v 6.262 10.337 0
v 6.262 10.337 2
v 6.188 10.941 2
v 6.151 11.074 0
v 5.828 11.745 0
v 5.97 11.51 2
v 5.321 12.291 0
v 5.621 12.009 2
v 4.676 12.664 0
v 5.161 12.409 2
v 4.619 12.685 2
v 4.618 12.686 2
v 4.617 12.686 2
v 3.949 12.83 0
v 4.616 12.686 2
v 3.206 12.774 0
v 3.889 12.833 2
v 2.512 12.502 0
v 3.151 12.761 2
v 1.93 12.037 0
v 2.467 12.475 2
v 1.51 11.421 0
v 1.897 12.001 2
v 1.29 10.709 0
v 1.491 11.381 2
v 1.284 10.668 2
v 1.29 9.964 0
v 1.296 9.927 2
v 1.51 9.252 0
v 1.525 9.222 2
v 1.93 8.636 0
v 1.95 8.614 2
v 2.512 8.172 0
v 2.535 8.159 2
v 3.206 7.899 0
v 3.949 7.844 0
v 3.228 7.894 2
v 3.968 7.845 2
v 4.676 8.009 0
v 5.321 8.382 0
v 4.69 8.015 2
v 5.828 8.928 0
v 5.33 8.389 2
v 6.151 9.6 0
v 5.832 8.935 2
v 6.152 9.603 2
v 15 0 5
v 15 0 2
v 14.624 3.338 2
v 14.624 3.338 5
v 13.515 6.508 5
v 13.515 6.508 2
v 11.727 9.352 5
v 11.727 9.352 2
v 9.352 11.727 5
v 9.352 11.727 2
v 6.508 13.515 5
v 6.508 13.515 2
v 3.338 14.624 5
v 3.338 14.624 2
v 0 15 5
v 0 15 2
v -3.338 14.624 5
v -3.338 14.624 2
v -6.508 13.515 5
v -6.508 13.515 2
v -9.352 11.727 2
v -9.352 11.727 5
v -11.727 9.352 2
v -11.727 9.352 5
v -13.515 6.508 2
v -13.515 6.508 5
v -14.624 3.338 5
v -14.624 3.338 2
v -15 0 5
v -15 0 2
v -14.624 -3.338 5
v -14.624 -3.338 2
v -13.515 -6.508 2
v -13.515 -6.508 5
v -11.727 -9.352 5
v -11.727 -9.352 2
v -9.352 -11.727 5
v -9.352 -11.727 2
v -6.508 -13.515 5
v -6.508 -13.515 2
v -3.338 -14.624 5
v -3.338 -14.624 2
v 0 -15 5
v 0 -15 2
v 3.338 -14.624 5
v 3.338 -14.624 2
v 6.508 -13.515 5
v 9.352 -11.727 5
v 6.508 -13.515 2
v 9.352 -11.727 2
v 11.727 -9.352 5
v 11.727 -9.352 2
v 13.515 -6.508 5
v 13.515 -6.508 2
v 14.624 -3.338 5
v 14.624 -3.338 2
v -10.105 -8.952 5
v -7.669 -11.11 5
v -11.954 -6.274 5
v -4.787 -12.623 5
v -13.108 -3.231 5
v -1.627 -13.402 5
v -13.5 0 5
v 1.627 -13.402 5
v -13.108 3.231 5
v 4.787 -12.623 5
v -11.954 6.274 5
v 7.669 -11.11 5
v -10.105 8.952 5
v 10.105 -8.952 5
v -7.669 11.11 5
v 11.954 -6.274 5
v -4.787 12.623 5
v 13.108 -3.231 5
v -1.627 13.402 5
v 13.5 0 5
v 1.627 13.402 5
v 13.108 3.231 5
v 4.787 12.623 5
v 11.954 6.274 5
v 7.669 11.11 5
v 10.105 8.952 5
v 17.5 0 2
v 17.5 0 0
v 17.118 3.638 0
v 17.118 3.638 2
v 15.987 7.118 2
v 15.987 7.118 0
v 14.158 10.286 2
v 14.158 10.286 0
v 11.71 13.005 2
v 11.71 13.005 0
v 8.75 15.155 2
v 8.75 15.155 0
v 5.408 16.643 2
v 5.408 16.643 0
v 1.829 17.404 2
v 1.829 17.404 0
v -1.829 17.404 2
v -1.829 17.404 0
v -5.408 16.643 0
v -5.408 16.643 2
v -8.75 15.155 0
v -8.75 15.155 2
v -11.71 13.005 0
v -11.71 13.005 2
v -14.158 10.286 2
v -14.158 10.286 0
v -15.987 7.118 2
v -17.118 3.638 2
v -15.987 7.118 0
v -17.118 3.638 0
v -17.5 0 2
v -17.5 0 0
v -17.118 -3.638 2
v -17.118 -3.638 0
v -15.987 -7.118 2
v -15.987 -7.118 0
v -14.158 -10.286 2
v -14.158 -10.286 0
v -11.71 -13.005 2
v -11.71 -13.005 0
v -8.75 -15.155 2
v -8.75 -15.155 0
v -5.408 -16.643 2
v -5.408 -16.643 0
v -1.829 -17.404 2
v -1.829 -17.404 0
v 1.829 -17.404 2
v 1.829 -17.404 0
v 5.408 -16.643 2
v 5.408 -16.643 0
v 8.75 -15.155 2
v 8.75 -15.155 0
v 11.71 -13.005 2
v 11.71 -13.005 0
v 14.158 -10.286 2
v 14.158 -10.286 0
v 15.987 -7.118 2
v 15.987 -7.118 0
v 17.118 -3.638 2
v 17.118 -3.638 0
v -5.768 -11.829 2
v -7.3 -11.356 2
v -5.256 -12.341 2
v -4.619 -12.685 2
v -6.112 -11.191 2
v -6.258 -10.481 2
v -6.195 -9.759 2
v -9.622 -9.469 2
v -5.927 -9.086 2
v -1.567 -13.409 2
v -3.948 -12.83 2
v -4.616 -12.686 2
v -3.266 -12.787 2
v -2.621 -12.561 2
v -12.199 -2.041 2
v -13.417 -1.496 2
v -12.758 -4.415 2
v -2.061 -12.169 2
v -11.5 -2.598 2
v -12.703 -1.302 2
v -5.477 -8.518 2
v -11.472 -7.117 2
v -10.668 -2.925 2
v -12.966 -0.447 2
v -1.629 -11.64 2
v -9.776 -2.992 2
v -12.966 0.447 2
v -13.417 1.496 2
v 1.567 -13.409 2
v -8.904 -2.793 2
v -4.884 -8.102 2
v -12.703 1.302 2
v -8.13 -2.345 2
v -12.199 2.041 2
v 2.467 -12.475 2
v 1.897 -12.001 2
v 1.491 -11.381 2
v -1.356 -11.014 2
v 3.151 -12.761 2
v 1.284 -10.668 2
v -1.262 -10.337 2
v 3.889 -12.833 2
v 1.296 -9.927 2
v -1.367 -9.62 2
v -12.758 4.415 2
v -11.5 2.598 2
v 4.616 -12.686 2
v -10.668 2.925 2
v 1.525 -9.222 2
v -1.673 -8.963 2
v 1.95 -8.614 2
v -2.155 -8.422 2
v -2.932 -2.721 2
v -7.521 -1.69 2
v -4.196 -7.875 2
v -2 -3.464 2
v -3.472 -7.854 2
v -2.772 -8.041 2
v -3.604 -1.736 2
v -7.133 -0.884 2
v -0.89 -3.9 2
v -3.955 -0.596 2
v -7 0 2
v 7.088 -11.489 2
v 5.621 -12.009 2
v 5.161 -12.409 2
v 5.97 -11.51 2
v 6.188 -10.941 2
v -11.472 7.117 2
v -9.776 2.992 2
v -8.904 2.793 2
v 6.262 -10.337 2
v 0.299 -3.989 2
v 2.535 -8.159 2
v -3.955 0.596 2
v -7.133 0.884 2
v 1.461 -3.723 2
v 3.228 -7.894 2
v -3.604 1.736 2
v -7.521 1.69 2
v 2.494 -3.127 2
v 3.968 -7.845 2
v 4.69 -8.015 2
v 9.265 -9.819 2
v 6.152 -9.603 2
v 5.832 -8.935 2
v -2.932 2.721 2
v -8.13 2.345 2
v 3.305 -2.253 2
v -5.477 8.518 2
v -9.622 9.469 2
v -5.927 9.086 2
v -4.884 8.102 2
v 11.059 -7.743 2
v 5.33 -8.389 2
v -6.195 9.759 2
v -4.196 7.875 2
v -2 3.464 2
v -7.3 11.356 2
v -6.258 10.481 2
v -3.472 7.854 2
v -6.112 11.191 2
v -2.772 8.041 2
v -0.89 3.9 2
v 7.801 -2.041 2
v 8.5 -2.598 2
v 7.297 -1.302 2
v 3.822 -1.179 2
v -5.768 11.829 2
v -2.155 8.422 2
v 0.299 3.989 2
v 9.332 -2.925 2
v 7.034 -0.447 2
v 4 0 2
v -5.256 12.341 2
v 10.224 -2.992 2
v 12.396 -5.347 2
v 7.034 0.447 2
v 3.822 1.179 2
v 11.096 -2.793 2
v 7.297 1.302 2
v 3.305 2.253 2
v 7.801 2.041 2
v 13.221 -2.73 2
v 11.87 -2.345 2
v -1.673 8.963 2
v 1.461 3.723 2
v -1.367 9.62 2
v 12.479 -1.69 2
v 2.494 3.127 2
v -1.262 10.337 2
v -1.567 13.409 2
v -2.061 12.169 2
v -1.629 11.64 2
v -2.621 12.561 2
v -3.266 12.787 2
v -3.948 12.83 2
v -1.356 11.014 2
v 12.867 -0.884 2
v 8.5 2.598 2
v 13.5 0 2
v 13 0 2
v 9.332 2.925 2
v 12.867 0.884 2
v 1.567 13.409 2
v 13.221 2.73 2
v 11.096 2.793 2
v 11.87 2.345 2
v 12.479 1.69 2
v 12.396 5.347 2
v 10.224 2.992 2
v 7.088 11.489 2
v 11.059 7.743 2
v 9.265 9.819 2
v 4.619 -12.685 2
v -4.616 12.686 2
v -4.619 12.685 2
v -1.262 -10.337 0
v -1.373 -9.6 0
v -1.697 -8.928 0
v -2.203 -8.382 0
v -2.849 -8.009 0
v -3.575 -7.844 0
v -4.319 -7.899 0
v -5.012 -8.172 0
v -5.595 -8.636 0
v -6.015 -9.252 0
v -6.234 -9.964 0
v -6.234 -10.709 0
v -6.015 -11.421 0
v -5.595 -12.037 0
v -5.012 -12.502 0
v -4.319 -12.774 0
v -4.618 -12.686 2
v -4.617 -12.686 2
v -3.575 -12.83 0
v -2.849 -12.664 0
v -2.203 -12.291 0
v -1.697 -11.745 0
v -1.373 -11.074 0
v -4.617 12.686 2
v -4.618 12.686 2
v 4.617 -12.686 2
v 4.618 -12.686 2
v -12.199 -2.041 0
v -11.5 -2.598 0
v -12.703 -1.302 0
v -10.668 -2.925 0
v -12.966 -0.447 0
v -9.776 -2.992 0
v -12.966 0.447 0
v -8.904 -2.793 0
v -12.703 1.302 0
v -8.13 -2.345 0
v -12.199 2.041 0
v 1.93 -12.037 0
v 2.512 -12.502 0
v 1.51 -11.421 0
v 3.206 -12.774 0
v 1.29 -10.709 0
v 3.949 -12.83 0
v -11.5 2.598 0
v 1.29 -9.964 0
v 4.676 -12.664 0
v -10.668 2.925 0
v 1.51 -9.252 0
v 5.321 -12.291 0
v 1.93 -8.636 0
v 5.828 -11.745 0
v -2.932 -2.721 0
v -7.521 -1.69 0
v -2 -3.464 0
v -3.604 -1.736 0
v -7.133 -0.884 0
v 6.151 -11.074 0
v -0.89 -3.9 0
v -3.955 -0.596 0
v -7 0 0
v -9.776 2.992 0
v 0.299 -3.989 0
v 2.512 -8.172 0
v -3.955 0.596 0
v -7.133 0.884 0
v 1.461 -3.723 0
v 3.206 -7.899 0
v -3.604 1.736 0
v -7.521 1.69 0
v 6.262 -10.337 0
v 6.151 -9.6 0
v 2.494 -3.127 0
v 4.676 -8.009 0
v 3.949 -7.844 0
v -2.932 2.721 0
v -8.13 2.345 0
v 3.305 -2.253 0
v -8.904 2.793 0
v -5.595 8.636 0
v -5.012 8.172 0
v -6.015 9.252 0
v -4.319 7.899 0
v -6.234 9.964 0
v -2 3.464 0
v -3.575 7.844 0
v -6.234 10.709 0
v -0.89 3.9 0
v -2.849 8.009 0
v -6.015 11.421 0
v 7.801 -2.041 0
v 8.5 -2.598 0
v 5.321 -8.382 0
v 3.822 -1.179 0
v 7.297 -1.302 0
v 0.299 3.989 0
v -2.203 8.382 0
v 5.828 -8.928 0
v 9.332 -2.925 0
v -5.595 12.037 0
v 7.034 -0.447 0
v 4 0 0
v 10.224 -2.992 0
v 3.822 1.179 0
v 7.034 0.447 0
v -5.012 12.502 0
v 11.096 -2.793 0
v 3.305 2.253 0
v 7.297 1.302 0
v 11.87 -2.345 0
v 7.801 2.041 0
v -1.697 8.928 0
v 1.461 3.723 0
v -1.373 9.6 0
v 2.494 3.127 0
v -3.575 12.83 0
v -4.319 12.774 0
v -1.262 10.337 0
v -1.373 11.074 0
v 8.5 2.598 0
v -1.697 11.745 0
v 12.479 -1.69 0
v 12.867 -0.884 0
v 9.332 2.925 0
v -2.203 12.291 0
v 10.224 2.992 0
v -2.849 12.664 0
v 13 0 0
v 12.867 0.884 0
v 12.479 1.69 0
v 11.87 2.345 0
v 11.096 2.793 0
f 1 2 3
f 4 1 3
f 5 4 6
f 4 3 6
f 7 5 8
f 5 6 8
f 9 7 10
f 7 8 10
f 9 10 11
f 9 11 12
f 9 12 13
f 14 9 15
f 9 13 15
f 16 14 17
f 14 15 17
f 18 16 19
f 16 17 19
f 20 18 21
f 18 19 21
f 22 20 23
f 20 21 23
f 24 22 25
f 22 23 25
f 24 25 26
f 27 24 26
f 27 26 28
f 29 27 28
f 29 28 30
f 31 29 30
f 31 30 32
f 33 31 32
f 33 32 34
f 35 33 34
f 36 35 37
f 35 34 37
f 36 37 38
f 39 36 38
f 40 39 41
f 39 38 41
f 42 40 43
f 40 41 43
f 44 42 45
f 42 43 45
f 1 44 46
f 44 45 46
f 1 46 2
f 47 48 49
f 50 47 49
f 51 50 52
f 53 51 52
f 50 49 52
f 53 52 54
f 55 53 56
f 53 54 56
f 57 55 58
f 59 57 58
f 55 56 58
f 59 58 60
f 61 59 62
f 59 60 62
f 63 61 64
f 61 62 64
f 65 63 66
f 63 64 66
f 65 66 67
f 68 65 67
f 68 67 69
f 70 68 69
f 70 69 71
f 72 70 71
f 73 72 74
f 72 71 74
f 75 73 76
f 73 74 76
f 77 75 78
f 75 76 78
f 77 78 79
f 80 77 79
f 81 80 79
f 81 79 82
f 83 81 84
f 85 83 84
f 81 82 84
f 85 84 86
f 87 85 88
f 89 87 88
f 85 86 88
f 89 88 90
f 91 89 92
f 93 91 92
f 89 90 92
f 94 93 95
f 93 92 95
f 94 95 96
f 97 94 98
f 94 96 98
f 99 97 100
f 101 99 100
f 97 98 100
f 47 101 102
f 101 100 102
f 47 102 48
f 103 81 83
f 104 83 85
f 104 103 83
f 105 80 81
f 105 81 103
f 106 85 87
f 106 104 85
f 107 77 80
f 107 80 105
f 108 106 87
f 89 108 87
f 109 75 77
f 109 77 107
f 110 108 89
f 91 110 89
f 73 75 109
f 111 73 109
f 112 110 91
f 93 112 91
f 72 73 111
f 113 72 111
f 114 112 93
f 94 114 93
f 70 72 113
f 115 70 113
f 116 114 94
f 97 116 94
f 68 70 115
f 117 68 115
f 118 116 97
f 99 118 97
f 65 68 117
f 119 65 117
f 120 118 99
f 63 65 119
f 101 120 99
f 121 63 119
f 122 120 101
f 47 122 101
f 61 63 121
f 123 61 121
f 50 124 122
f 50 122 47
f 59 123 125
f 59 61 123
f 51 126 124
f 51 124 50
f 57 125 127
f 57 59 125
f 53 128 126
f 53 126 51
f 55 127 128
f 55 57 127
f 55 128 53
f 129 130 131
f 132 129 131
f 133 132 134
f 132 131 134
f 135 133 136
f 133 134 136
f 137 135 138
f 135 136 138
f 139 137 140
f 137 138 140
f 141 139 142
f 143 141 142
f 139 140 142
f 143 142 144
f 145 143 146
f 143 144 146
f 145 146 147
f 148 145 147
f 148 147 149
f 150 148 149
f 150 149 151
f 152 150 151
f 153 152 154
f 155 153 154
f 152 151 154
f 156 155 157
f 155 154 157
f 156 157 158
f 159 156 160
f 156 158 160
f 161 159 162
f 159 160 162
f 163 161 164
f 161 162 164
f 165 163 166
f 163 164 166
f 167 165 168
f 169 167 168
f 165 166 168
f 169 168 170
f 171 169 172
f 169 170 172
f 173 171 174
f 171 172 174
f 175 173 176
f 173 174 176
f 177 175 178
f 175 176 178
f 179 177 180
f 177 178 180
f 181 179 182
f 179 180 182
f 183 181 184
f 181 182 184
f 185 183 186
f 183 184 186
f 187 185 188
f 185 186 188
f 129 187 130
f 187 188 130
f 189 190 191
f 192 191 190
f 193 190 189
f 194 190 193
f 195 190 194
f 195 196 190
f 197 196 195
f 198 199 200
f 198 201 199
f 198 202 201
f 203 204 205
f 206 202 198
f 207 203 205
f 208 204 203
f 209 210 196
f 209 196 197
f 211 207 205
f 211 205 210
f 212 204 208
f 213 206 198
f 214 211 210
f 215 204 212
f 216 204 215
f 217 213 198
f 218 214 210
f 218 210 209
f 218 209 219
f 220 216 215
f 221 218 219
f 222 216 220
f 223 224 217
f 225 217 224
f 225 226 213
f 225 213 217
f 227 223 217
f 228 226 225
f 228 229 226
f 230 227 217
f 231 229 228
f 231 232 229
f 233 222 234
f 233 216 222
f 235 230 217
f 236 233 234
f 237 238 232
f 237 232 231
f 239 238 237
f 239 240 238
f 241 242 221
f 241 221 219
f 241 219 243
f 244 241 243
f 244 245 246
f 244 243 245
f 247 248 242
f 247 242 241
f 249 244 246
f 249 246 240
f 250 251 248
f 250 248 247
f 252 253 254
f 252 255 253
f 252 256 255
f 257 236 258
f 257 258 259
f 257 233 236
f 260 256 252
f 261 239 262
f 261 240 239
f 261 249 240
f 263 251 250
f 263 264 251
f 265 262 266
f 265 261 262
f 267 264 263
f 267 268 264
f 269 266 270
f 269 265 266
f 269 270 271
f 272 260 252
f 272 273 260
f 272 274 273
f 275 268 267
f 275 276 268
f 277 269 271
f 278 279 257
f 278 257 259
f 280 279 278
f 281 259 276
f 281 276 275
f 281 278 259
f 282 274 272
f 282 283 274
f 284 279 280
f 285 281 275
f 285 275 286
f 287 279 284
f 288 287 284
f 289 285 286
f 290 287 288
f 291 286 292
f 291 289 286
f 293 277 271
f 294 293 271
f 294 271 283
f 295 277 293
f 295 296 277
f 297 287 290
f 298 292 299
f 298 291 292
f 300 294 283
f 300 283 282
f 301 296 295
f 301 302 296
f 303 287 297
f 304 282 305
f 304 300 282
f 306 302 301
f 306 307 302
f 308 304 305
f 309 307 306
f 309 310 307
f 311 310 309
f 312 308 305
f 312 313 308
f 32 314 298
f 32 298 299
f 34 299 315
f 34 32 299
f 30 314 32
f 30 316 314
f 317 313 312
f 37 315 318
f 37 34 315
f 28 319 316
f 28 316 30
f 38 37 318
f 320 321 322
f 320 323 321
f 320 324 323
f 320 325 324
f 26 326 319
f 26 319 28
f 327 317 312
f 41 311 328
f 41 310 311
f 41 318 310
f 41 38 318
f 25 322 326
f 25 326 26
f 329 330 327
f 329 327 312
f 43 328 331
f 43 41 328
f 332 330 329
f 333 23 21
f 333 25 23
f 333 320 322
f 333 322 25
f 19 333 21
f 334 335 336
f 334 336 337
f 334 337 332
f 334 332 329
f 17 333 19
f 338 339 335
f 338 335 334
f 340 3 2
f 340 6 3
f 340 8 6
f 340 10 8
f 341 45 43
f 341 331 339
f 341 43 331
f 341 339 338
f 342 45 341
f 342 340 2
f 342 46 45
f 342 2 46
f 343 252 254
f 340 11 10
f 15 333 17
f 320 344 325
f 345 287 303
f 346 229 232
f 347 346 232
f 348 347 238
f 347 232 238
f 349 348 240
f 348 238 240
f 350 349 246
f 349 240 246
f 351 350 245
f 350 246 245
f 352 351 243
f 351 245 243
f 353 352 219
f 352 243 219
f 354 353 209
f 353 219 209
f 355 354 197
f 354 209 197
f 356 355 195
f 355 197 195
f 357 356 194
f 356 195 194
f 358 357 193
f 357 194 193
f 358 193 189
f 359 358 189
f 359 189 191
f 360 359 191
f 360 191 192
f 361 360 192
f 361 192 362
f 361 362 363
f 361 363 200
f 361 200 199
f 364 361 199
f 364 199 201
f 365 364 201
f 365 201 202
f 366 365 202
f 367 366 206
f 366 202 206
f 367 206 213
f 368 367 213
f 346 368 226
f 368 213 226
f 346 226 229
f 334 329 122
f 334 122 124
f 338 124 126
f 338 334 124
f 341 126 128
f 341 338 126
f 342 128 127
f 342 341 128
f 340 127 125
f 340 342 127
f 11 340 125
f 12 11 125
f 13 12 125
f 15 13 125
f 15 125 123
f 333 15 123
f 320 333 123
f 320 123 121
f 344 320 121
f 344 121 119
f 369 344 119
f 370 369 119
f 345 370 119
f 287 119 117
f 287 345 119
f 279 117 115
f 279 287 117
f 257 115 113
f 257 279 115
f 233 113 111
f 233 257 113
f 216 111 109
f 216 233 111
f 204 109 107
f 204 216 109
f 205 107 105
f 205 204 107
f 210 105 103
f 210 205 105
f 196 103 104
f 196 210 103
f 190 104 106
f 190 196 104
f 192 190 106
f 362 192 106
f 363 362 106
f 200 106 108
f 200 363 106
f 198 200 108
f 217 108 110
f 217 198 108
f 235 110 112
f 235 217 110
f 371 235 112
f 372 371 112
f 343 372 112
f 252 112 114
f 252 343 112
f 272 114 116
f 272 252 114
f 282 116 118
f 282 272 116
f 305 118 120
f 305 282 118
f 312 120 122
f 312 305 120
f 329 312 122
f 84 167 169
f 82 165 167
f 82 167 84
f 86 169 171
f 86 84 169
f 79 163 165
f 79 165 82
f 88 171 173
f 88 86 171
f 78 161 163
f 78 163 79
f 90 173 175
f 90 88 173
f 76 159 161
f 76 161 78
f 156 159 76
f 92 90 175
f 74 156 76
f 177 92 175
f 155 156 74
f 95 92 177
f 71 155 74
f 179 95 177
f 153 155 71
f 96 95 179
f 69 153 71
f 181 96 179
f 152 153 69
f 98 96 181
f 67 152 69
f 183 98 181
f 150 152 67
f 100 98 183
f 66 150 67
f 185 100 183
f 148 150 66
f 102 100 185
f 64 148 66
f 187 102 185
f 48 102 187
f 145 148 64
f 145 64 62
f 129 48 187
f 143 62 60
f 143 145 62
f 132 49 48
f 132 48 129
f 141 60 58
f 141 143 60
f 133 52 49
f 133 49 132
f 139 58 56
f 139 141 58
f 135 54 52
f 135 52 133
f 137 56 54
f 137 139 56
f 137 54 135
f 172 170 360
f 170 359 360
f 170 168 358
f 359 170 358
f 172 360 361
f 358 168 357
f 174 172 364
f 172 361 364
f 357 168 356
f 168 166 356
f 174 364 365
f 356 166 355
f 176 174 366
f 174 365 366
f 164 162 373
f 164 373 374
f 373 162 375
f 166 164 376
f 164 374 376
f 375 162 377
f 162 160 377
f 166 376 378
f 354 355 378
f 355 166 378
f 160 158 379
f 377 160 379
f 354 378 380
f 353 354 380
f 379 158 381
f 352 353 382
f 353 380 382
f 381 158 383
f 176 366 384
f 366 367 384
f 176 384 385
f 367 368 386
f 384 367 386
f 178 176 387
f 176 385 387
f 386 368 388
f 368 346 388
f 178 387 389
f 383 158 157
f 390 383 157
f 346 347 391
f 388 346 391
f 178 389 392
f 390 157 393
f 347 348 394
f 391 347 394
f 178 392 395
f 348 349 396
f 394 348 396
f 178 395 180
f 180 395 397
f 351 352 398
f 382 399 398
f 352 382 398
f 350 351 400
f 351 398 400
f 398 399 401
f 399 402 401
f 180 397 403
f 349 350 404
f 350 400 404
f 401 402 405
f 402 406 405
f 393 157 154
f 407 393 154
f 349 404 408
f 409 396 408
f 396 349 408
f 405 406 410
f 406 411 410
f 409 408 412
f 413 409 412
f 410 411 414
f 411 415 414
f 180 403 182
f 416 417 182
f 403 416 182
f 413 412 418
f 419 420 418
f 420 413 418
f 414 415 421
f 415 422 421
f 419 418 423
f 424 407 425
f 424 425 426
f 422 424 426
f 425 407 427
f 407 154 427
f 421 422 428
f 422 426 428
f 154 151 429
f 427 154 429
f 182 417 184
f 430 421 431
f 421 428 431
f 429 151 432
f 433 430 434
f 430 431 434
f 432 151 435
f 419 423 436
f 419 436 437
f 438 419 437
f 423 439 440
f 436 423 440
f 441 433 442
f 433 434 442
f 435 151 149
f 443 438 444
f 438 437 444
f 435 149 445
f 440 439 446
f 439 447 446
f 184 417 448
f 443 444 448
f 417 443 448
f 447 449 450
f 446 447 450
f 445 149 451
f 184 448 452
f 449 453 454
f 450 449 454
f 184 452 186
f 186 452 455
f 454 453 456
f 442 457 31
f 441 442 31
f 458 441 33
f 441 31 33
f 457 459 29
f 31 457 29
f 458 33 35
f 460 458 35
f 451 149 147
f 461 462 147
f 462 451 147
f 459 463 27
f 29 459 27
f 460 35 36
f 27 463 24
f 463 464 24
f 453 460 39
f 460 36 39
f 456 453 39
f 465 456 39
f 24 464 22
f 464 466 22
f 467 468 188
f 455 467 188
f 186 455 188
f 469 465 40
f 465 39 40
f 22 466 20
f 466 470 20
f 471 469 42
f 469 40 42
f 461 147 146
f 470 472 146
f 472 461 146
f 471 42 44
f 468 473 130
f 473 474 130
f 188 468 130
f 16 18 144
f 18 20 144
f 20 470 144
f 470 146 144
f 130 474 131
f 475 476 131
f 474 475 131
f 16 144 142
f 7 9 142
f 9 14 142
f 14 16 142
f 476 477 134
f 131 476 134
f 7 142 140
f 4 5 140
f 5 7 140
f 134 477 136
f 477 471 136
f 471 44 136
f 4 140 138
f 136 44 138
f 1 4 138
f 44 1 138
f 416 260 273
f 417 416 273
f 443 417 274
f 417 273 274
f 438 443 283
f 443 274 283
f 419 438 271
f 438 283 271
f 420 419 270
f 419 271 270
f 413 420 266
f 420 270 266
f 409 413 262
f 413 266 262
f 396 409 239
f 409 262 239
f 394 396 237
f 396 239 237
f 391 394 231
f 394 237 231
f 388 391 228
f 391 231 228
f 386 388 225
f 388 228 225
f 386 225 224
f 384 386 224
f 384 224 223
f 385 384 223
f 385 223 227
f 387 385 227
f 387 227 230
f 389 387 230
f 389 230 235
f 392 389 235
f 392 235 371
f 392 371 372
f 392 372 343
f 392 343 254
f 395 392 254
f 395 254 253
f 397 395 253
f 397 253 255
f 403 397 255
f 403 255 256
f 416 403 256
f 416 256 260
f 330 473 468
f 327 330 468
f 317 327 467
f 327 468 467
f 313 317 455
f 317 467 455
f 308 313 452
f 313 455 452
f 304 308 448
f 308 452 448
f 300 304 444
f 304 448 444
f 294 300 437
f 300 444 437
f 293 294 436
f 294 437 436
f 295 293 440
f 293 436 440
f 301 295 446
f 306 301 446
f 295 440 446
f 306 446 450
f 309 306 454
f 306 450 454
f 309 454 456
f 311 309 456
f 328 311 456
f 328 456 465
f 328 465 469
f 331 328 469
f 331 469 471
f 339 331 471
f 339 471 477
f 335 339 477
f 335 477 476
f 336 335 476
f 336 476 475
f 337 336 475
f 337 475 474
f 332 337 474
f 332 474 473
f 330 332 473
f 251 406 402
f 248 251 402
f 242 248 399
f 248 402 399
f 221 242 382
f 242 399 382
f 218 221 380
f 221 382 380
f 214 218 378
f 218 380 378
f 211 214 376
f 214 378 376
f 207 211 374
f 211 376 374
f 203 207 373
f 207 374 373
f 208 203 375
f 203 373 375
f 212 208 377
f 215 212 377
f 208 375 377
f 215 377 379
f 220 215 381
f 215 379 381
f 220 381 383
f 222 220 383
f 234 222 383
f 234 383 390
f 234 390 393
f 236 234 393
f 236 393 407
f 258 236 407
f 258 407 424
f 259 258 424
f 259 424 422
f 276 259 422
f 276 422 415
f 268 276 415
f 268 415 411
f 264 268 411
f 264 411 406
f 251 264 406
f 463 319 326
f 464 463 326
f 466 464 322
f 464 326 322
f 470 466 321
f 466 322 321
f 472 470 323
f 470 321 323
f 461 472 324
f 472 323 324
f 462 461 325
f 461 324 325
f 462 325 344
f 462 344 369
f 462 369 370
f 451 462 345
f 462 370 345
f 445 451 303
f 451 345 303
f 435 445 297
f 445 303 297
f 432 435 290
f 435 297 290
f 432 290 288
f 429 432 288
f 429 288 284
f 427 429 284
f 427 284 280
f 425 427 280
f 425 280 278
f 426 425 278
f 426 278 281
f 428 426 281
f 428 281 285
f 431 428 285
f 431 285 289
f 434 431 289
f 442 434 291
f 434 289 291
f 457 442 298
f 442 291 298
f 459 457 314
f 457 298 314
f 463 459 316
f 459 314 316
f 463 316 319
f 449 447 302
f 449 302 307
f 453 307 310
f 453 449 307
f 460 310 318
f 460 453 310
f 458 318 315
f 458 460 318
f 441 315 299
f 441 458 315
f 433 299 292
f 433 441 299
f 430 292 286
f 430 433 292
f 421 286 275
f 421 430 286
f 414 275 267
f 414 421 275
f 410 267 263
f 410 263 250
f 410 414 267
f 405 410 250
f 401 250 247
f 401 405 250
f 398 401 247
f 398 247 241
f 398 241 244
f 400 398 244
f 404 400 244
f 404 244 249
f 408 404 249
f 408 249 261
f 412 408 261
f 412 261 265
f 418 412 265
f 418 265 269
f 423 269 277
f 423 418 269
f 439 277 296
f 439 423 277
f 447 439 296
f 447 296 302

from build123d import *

# Parameters (mm, degrees)
SKETCH_R        = 17.5
SKETCH_R_2      = 4
PAD_DEPTH       = 2
SKETCH001_R     = 15
SKETCH001_R_2   = 13.5
PAD001_DEPTH    = 3
SKETCH002_R     = 3
POCKET_DEPTH    = 5
SKETCH004_R     = 2.5
POCKET001_DEPTH = 2.001


with BuildPart() as part:
    # Sketch → Pad (new body)
    with BuildSketch(Plane.XY):
        Circle(SKETCH_R)
        Circle(SKETCH_R_2, mode=Mode.SUBTRACT)
    extrude(amount=PAD_DEPTH)

    # Sketch001 (on Face4 of Pad) → Pad001 (join)
    with BuildSketch(Plane.XY.offset(2)):
        Circle(SKETCH001_R)
        Circle(SKETCH001_R_2, mode=Mode.SUBTRACT)
    extrude(amount=PAD001_DEPTH)

    # Sketch002 (on Face2 of Pad001) → Pocket (cut)
    with BuildSketch(Plane(origin=(0, 0, 0), x_dir=(1, 0, 0), z_dir=(0, 0, -1))):
        with Locations((-10, 0)):
            Circle(SKETCH002_R)
        with Locations((10, 0)):
            Circle(SKETCH002_R)
    extrude(amount=-POCKET_DEPTH, mode=Mode.SUBTRACT)

    # Sketch004 (on Face8 of Pocket) → Pocket001 (cut, through all)
    with BuildSketch(Plane.XY.offset(2)):
        with Locations((3.762222, -10.336619)):
            Circle(SKETCH004_R)
        with Locations((-3.762222, -10.336619)):
            Circle(SKETCH004_R)
        with Locations((3.762222, 10.336619)):
            Circle(SKETCH004_R)
        with Locations((-3.762222, 10.336619)):
            Circle(SKETCH004_R)
    extrude(amount=-POCKET001_DEPTH, mode=Mode.SUBTRACT)


solid = part.part
